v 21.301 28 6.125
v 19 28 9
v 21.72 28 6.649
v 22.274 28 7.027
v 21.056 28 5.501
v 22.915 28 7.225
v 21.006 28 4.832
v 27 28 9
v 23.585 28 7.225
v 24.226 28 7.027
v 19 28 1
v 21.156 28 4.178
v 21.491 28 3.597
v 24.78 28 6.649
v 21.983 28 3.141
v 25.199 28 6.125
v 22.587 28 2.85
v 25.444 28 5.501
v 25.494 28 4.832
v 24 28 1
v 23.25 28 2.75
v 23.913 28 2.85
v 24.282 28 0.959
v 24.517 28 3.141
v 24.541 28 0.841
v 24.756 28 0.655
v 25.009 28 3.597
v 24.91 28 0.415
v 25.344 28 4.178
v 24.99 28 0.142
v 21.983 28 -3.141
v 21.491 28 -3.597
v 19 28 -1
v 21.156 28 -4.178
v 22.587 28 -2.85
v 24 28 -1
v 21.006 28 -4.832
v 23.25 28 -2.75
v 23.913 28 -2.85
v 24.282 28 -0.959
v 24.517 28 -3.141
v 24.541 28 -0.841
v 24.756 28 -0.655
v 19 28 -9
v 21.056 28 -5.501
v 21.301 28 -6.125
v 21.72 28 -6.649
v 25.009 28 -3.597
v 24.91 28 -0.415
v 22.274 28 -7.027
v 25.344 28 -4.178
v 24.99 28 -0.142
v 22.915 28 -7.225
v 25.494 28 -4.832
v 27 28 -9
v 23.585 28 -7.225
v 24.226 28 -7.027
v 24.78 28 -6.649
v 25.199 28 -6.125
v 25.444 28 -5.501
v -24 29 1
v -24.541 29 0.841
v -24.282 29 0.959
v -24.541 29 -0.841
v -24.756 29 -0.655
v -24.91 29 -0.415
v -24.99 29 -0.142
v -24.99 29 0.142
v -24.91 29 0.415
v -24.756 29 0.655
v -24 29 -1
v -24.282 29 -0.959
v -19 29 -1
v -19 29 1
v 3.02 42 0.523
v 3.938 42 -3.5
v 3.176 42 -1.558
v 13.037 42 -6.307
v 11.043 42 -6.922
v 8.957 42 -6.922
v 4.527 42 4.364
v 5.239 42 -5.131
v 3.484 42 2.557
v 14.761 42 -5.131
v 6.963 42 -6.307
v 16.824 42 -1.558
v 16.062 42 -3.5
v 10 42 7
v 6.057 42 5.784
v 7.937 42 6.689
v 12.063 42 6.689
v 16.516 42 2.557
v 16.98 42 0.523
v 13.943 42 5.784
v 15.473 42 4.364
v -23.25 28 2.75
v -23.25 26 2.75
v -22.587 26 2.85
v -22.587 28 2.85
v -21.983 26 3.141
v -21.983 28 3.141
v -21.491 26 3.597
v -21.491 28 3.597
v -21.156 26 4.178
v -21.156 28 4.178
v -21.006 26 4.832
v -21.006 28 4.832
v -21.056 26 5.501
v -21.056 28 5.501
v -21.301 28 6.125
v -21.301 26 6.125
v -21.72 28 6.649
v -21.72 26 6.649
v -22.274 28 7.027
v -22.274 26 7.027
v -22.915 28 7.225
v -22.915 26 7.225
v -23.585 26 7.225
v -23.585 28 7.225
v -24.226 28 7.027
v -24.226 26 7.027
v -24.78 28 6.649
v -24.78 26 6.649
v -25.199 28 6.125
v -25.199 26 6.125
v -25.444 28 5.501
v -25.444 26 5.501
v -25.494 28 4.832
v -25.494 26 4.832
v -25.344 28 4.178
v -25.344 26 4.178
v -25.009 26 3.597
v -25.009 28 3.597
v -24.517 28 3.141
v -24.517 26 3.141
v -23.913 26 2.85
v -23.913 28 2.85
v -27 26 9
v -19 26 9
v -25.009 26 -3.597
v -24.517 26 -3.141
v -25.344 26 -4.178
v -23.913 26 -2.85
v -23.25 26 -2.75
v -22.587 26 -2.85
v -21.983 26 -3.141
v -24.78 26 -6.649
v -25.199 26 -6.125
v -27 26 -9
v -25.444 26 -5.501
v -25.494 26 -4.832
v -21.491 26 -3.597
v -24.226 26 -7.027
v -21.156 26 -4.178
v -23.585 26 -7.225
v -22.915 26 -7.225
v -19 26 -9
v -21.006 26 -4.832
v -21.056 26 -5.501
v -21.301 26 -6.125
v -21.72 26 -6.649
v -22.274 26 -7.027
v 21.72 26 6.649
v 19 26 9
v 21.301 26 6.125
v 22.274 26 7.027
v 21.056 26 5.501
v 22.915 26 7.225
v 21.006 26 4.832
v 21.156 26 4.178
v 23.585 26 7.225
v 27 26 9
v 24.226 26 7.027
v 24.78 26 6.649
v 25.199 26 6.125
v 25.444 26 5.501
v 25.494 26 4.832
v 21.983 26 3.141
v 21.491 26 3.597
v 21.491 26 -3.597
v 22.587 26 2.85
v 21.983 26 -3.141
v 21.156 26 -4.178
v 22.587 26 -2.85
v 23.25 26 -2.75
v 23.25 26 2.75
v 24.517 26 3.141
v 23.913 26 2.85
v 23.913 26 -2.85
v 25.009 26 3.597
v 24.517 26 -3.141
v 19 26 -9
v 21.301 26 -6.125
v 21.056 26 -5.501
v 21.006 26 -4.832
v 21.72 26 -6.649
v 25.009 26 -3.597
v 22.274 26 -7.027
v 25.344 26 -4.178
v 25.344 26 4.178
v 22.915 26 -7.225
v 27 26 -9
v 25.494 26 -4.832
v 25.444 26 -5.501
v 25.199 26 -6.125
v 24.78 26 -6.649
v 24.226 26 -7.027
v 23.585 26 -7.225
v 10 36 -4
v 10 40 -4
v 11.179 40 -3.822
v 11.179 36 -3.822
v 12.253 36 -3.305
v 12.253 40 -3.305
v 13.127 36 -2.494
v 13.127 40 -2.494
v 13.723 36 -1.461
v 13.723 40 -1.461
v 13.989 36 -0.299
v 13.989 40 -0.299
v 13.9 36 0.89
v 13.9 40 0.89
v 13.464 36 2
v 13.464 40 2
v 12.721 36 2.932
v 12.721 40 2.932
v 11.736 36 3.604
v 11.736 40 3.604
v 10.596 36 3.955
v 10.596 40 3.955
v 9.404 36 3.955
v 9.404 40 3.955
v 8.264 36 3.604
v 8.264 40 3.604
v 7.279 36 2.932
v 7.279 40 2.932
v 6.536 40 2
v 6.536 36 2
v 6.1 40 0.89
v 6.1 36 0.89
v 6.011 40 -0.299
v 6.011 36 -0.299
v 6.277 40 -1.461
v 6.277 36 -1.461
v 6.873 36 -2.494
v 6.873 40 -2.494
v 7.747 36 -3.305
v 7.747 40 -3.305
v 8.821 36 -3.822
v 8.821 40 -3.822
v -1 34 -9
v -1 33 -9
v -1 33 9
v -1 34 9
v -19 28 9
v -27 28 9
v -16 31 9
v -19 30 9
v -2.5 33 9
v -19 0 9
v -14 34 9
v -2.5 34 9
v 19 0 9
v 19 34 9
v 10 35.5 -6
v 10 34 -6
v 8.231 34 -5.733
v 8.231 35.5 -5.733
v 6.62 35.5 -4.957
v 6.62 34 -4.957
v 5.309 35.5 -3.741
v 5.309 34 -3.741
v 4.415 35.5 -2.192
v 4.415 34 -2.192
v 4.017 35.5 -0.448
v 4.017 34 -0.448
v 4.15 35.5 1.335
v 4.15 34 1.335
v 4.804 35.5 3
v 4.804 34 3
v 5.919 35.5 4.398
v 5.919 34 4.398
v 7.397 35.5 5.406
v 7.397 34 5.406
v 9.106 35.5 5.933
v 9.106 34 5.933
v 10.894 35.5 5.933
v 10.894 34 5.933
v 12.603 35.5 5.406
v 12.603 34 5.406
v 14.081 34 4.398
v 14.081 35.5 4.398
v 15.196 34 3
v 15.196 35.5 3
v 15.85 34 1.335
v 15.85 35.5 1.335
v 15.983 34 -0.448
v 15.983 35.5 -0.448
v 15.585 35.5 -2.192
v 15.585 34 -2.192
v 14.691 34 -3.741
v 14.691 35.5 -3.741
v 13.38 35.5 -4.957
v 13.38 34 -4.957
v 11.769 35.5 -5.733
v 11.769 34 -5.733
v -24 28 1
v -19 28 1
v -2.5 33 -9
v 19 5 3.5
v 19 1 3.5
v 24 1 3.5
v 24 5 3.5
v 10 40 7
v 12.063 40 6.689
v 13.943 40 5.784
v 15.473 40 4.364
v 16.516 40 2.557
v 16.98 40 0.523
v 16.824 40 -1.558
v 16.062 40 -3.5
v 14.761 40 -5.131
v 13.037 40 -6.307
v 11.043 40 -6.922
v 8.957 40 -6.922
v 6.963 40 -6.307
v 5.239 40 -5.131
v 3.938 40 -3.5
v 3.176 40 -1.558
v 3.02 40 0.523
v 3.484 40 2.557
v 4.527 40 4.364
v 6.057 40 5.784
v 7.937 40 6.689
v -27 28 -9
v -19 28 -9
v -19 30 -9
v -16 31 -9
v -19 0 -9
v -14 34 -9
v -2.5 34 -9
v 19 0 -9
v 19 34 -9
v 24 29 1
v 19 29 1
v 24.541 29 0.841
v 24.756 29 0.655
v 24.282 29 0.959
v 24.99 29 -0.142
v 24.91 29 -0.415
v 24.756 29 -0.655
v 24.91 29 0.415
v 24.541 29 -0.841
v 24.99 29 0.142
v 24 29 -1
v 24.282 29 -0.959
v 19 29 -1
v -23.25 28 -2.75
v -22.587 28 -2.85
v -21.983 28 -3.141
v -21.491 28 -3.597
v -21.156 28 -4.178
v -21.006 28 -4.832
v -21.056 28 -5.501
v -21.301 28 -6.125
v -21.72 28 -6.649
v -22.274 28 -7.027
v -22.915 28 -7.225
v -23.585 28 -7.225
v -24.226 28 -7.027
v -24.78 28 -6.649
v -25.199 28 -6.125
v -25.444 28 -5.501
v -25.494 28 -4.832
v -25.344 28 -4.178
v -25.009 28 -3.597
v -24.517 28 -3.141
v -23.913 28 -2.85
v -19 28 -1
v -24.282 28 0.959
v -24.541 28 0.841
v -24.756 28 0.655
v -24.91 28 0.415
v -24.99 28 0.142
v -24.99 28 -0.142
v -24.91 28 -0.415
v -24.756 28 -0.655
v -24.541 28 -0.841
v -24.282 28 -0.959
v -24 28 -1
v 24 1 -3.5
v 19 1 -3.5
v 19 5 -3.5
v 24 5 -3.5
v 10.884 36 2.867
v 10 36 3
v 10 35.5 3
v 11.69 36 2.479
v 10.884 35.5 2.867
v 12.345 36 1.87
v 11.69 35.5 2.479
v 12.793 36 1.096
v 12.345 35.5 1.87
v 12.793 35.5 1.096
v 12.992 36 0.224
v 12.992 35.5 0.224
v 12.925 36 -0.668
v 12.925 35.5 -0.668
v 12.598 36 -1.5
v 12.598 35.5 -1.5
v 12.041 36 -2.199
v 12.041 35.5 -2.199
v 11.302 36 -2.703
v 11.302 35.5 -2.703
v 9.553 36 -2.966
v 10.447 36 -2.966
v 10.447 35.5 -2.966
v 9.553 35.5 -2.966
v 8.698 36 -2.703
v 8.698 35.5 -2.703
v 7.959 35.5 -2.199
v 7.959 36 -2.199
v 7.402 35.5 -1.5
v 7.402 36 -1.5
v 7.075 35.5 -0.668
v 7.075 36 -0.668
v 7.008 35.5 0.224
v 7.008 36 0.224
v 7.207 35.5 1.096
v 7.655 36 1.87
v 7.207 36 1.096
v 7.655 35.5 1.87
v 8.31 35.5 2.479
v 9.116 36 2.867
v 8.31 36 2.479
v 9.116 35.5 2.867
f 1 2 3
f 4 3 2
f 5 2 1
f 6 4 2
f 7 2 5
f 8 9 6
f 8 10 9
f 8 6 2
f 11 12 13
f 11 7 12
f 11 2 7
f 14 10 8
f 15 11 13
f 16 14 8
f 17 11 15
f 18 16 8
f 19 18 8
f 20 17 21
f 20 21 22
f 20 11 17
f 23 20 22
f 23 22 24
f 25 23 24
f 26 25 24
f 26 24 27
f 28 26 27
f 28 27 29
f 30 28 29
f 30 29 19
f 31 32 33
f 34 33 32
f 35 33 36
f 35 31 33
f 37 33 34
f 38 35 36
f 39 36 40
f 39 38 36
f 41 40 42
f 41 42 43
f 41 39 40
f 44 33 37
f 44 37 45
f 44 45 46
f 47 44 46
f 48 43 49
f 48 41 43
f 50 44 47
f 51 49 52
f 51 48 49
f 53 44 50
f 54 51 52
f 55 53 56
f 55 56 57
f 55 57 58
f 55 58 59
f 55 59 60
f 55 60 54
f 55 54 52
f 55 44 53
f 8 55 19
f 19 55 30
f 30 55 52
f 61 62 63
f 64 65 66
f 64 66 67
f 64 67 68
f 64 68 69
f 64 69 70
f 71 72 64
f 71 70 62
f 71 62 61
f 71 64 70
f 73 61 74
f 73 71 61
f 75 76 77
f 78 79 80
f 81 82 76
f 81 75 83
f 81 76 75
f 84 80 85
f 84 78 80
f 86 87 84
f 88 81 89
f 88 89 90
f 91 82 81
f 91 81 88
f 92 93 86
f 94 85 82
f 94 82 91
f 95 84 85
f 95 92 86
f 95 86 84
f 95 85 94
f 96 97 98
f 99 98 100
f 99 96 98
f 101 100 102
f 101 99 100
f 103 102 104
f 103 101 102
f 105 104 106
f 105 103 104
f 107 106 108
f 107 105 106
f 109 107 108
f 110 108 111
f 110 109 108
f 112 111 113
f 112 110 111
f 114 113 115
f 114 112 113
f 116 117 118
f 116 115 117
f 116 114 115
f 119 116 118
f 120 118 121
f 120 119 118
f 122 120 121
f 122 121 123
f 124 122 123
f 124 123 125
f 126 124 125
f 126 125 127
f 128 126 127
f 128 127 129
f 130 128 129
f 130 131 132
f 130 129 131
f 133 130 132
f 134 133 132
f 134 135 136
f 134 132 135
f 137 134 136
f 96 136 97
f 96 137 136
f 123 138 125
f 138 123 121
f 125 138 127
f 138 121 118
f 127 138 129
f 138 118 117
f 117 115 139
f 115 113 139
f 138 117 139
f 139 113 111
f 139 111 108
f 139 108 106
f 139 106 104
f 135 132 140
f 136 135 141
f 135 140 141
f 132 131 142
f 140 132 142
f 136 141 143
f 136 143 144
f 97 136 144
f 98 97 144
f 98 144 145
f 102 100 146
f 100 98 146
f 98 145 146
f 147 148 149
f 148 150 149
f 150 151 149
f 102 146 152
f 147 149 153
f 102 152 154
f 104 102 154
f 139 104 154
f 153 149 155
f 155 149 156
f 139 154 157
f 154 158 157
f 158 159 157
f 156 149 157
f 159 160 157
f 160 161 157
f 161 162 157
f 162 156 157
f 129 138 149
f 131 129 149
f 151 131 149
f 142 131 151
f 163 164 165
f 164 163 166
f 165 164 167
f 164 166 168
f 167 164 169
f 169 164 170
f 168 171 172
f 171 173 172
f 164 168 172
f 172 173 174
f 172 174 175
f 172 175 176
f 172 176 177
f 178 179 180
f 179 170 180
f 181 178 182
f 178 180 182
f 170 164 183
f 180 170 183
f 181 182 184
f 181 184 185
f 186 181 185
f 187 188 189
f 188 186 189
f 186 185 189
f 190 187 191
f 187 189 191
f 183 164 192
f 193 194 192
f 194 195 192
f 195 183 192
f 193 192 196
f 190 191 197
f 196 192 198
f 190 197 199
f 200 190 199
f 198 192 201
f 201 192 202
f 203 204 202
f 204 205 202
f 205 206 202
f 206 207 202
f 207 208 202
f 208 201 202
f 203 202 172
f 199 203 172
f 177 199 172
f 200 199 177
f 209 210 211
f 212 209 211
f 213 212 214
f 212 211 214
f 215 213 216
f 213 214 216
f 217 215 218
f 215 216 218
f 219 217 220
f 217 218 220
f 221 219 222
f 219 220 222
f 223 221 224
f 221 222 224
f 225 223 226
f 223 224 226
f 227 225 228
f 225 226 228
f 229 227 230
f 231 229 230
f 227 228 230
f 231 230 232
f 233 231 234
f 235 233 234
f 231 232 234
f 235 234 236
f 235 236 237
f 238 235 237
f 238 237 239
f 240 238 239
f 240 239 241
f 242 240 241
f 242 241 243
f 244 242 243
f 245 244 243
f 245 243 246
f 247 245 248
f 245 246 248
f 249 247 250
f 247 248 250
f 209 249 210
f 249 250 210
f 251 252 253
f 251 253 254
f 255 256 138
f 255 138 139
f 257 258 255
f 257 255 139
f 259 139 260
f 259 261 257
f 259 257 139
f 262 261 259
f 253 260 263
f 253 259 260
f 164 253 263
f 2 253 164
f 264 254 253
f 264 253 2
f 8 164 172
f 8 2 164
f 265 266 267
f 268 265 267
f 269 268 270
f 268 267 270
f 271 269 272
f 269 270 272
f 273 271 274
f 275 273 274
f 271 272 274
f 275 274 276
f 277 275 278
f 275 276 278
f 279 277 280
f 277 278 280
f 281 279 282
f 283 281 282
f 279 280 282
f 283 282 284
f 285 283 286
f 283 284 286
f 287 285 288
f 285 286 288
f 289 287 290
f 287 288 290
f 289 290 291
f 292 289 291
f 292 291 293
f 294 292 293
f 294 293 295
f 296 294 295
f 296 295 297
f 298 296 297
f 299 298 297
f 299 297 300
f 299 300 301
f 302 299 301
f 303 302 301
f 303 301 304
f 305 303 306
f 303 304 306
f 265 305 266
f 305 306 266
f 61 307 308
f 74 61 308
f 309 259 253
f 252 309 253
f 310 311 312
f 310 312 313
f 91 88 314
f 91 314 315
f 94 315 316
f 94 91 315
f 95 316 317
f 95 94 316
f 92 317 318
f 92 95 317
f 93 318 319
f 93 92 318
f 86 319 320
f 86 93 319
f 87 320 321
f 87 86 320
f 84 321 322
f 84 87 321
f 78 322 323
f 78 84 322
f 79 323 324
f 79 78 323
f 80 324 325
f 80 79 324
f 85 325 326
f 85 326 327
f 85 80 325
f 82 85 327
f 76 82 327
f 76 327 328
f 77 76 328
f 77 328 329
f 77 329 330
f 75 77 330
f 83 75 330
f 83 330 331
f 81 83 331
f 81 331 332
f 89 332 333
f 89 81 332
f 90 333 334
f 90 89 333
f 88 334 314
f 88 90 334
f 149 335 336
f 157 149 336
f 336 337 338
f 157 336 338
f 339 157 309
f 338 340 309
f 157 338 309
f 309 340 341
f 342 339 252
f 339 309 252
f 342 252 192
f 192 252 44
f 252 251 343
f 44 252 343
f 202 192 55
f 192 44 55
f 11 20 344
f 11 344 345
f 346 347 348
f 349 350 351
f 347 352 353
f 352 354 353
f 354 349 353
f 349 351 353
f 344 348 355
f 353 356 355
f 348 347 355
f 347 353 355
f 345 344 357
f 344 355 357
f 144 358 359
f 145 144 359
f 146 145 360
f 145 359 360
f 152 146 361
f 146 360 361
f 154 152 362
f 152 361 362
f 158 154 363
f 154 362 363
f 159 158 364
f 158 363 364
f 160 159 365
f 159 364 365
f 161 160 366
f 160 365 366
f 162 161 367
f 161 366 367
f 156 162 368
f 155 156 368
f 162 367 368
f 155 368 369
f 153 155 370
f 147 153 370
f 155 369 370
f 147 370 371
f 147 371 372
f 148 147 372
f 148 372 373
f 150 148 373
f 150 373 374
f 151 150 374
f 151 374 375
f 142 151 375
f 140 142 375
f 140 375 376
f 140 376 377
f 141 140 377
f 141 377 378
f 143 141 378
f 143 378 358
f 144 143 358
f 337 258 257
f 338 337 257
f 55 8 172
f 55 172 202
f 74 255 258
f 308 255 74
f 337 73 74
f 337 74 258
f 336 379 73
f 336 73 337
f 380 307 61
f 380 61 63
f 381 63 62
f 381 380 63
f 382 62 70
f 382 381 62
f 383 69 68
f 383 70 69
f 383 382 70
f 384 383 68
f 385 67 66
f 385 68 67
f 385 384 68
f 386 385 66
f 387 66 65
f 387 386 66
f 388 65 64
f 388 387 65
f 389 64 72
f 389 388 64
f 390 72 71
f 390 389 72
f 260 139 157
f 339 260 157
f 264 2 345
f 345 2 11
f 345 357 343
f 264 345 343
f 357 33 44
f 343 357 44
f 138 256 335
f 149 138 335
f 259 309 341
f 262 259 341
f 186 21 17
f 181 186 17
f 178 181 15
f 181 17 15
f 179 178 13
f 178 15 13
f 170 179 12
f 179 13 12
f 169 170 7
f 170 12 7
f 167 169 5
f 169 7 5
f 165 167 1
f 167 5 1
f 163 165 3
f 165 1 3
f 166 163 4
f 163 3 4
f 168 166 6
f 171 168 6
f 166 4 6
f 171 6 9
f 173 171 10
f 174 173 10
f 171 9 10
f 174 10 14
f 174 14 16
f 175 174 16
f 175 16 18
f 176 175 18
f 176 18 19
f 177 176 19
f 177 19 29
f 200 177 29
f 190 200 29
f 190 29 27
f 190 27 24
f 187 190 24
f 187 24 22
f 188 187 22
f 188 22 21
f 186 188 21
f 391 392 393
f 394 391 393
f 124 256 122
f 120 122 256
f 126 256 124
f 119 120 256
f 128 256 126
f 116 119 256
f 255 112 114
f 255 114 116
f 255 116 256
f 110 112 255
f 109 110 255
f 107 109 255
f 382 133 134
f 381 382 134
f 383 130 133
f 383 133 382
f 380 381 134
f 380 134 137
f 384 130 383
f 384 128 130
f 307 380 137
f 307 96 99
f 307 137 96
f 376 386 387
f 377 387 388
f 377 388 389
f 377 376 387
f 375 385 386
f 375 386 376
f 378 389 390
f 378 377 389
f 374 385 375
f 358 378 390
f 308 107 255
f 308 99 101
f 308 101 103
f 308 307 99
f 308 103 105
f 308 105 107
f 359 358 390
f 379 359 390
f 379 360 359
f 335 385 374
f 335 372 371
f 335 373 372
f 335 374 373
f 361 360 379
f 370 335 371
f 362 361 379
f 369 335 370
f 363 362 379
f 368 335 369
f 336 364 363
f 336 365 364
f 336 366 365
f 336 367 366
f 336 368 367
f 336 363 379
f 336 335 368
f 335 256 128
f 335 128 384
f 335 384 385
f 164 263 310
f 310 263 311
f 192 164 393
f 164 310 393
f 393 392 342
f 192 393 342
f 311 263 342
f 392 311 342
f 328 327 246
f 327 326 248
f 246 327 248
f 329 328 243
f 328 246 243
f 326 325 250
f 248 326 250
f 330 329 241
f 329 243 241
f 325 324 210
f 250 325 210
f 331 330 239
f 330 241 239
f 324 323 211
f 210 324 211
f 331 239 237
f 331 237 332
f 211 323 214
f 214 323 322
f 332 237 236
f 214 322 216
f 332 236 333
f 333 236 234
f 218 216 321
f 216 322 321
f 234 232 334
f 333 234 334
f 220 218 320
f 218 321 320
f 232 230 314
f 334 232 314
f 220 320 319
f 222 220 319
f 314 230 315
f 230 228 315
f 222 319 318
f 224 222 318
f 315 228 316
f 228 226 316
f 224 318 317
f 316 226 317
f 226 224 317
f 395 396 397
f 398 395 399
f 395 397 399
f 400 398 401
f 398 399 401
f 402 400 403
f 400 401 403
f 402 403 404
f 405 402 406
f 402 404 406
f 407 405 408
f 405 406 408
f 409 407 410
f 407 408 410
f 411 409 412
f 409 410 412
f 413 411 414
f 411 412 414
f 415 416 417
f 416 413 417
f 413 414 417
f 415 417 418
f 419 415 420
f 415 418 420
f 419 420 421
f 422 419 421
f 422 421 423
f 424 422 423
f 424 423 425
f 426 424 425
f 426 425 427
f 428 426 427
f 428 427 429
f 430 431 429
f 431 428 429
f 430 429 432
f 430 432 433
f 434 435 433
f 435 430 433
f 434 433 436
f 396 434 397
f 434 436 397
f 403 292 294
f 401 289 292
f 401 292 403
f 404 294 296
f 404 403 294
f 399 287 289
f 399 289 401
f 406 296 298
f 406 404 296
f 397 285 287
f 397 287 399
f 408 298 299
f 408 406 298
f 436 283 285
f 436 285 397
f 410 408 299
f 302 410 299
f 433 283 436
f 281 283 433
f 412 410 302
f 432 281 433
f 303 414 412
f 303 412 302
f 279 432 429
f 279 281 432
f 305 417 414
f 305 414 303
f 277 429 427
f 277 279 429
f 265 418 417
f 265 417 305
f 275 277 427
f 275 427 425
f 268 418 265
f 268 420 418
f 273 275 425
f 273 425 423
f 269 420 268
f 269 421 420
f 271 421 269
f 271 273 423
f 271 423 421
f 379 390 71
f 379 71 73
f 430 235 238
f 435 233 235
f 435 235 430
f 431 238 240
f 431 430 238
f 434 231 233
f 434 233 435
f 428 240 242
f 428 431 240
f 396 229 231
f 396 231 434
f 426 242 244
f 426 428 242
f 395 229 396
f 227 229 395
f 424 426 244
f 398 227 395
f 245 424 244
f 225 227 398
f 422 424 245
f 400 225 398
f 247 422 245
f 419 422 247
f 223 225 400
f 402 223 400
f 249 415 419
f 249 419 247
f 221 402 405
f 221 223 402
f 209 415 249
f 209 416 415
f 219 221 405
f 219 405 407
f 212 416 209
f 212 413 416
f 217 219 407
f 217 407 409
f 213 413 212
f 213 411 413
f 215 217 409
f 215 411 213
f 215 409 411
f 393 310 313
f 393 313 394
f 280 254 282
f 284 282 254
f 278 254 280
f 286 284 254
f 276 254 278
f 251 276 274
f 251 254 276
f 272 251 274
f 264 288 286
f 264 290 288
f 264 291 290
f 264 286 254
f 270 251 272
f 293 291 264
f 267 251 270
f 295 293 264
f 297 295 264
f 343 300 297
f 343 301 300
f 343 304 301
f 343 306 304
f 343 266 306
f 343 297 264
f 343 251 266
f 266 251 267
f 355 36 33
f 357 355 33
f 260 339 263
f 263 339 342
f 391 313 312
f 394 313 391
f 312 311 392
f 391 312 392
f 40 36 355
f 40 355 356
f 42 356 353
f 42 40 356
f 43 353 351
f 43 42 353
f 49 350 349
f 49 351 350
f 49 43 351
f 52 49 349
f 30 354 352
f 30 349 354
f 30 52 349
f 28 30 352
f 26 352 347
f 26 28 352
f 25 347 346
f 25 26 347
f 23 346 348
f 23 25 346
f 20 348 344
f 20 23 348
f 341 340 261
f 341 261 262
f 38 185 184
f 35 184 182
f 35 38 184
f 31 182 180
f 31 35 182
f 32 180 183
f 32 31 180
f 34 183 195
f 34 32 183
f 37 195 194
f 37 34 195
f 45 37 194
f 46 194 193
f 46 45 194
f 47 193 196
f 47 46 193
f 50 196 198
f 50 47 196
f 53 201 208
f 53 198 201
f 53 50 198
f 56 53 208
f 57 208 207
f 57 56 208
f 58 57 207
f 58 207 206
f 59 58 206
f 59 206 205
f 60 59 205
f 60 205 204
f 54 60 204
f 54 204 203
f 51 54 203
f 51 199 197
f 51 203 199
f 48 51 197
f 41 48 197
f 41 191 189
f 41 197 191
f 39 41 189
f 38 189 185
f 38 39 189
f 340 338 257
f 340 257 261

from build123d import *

# Parameters (mm, degrees)
SKETCH1_W                                  = 38
SKETCH1_H                                  = 18
BOSS_EXTRUDE1_DEPTH                        = 34
BOSS_EXTRUDE2_START                        = -6
SKETCH2_W                                  = 54
SKETCH2_H                                  = 18
BOSS_EXTRUDE2_DEPTH                        = 2
CUT_EXTRUDE1_DEPTH                         = 48
CUT_EXTRUDE1_DEPTH_BACK                    = 48
SKETCH3_W                                  = 1.5
SKETCH3_H                                  = 1
SKETCH4_R                                  = 6
BOSS_EXTRUDE3_DEPTH                        = 1.5
SKETCH5_W                                  = 6
SKETCH5_H                                  = 2
BOSS_EXTRUDE4_DEPTH                        = 1
FILLET1_RADIUS                             = 1
FILLET1_LENGTH                             = 1
FILLET1_OF_MIRROR1_2_RADIUS                = 1
FILLET1_OF_MIRROR1_2_LENGTH                = 1
SKETCH6_W                                  = 7
SKETCH6_H                                  = 4
BOSS_EXTRUDE5_DEPTH                        = 5
SKETCH7_R                                  = 3
BOSS_EXTRUDE6_DEPTH                        = 4
BOSS_EXTRUDE7_START                        = 8
SKETCH8_R                                  = 7
BOSS_EXTRUDE7_DEPTH                        = 2
SKETCH9_R                                  = 4
BOSS_EXTRUDE8_DEPTH                        = 4
SKETCH10_R                                 = 2.25
CUT_EXTRUDE2_DEPTH                         = 4
MIRROR2_AT_THE_SECOND_PLANE_COPY_1_SKETC_R = 2.25
MIRROR2_AT_THE_SECOND_PLANE_COPY_1_DEPTH   = 4


with BuildPart() as part:
    # Sketch1 → Boss-Extrude1 (new body)
    with BuildSketch(Plane(origin=(0, 0, 0), x_dir=(1, 0, 0), z_dir=(0, 1, 0))):
        Rectangle(SKETCH1_W, SKETCH1_H)
    extrude(amount=BOSS_EXTRUDE1_DEPTH)

    # Sketch2 → Boss-Extrude2 (add)
    with BuildSketch(Plane(origin=(0, 34, 0), x_dir=(1, 0, 0), z_dir=(0, 1, 0)).offset(BOSS_EXTRUDE2_START)):
        Rectangle(SKETCH2_W, SKETCH2_H)
    extrude(amount=-BOSS_EXTRUDE2_DEPTH)

    # Sketch3 → Cut-Extrude1 (cut, two sides: drawn at the far end of the back side and taken through both)
    with BuildSketch(Plane.XY.offset(9).offset(-CUT_EXTRUDE1_DEPTH_BACK)):
        Polygon((-19, 30), (-16, 31), (-14, 34), (-19, 34), align=None)
        with Locations((-1.75, 33.5)):
            Rectangle(SKETCH3_W, SKETCH3_H)
    extrude(amount=CUT_EXTRUDE1_DEPTH + CUT_EXTRUDE1_DEPTH_BACK, mode=Mode.SUBTRACT)

    # Sketch4 → Boss-Extrude3 (add)
    with BuildSketch(Plane(origin=(0, 34, 0), x_dir=(1, 0, 0), z_dir=(0, 1, 0))):
        with Locations(Location((10, 0, 0), (0, 0, 90))):
            Circle(SKETCH4_R)
    extrude(amount=BOSS_EXTRUDE3_DEPTH)

    # Sketch5 → Boss-Extrude4 (add)
    with BuildSketch(Plane(origin=(0, 28, 0), x_dir=(1, 0, 0), z_dir=(0, 1, 0))):
        with Locations((-22, 0)):
            Rectangle(SKETCH5_W, SKETCH5_H)
    boss_extrude4 = extrude(amount=BOSS_EXTRUDE4_DEPTH)

    # Fillet1: full round fillet: the end face becomes a half cylinder, R = half its width
    fillet1_face = Plane((-25, 28.5, 0), x_dir=(0, -1, 0), z_dir=(-1, 0, 0))  # on the end face: x along it, z out of the body
    fillet1_slab = fillet1_face.offset(-FILLET1_RADIUS / 2) * Box(FILLET1_LENGTH, 2 * FILLET1_RADIUS, FILLET1_RADIUS, mode=Mode.PRIVATE)  # the body's end, R deep
    fillet1_round = Plane((-24, 28.5, 0), x_dir=(-1, 0, 0), z_dir=(0, -1, 0)) * Cylinder(FILLET1_RADIUS, FILLET1_LENGTH, mode=Mode.PRIVATE)  # its axis R under the face
    add(fillet1_slab - fillet1_round, mode=Mode.SUBTRACT)

    # Mirror1: Boss-Extrude4 across plane
    add(boss_extrude4.mirror(Plane(origin=(0, 0, 0), x_dir=(0, 0, 1), z_dir=(1, 0, 0))))

    # Fillet1 of Mirror1 2: full round fillet: the end face becomes a half cylinder, R = half its width
    fillet1_of_mirror1_2_face = Plane((25, 28.5, 0), x_dir=(0, -1, 0), z_dir=(1, 0, 0))  # on the end face: x along it, z out of the body
    fillet1_of_mirror1_2_slab = fillet1_of_mirror1_2_face.offset(-FILLET1_OF_MIRROR1_2_RADIUS / 2) * Box(FILLET1_OF_MIRROR1_2_LENGTH, 2 * FILLET1_OF_MIRROR1_2_RADIUS, FILLET1_OF_MIRROR1_2_RADIUS, mode=Mode.PRIVATE)  # the body's end, R deep
    fillet1_of_mirror1_2_round = Plane((24, 28.5, 0), x_dir=(1, 0, 0), z_dir=(0, -1, 0)) * Cylinder(FILLET1_OF_MIRROR1_2_RADIUS, FILLET1_OF_MIRROR1_2_LENGTH, mode=Mode.PRIVATE)  # its axis R under the face
    add(fillet1_of_mirror1_2_slab - fillet1_of_mirror1_2_round, mode=Mode.SUBTRACT)

    # Sketch6 → Boss-Extrude5 (add)
    with BuildSketch(Plane(origin=(19, 0, 0), x_dir=(0, 0, -1), z_dir=(1, 0, 0))):
        with Locations((0, 3)):
            Rectangle(SKETCH6_W, SKETCH6_H)
    extrude(amount=BOSS_EXTRUDE5_DEPTH)

    # Sketch7 → Boss-Extrude6 (add)
    with BuildSketch(Plane(origin=(0, 35.5, 0), x_dir=(1, 0, 0), z_dir=(0, 1, 0))):
        with Locations(Location((10, 0, 0), (0, 0, 270))):
            Circle(SKETCH7_R)
    extrude(amount=BOSS_EXTRUDE6_DEPTH)



with BuildPart() as body_2:
    # Sketch8 → Boss-Extrude7 (new body)
    with BuildSketch(Plane(origin=(0, 34, 0), x_dir=(1, 0, 0), z_dir=(0, 1, 0)).offset(BOSS_EXTRUDE7_START)):
        with Locations(Location((10, 0, 0), (0, 0, 270))):
            Circle(SKETCH8_R)
    extrude(amount=-BOSS_EXTRUDE7_DEPTH)


with BuildPart() as part_1:
    add(part.part)

    add(body_2.part)  # Boss-Extrude8 merges body 2
    # Sketch9 → Boss-Extrude8 (add)
    with BuildSketch(Plane.XZ.offset(-40)):
        with Locations(Location((10, 0, 0), (0, 0, 270))):
            Circle(SKETCH9_R)
    extrude(amount=BOSS_EXTRUDE8_DEPTH)

    # Sketch10 → Cut-Extrude2 (cut)
    with BuildSketch(Plane(origin=(0, 28, 0), x_dir=(1, 0, 0), z_dir=(0, 1, 0))):
        with Locations(Location((-23.25, 5, 0), (0, 0, 270))):
            Circle(SKETCH10_R)
    cut_extrude2 = extrude(amount=-CUT_EXTRUDE2_DEPTH, mode=Mode.SUBTRACT)

    # Mirror2: Cut-Extrude2 across plane
    add(cut_extrude2.mirror(Plane.XY), mode=Mode.SUBTRACT)

    # Mirror2 at the second plane: Cut-Extrude2 across plane
    add(cut_extrude2.mirror(Plane(origin=(0, 0, 0), x_dir=(0, 0, 1), z_dir=(1, 0, 0))), mode=Mode.SUBTRACT)

    # Mirror2 at the second plane copy 1 sketc → Mirror2 at the second plane copy 1 (cut)
    with BuildSketch(Plane(origin=(0, 28, 0), x_dir=(-1, 0, 0), z_dir=(0, 1, 0))):
        with Locations(Location((-23.25, 5, 0), (0, 0, 270))):
            Circle(MIRROR2_AT_THE_SECOND_PLANE_COPY_1_SKETC_R)
    extrude(amount=-MIRROR2_AT_THE_SECOND_PLANE_COPY_1_DEPTH, mode=Mode.SUBTRACT)


solid = part_1.part
